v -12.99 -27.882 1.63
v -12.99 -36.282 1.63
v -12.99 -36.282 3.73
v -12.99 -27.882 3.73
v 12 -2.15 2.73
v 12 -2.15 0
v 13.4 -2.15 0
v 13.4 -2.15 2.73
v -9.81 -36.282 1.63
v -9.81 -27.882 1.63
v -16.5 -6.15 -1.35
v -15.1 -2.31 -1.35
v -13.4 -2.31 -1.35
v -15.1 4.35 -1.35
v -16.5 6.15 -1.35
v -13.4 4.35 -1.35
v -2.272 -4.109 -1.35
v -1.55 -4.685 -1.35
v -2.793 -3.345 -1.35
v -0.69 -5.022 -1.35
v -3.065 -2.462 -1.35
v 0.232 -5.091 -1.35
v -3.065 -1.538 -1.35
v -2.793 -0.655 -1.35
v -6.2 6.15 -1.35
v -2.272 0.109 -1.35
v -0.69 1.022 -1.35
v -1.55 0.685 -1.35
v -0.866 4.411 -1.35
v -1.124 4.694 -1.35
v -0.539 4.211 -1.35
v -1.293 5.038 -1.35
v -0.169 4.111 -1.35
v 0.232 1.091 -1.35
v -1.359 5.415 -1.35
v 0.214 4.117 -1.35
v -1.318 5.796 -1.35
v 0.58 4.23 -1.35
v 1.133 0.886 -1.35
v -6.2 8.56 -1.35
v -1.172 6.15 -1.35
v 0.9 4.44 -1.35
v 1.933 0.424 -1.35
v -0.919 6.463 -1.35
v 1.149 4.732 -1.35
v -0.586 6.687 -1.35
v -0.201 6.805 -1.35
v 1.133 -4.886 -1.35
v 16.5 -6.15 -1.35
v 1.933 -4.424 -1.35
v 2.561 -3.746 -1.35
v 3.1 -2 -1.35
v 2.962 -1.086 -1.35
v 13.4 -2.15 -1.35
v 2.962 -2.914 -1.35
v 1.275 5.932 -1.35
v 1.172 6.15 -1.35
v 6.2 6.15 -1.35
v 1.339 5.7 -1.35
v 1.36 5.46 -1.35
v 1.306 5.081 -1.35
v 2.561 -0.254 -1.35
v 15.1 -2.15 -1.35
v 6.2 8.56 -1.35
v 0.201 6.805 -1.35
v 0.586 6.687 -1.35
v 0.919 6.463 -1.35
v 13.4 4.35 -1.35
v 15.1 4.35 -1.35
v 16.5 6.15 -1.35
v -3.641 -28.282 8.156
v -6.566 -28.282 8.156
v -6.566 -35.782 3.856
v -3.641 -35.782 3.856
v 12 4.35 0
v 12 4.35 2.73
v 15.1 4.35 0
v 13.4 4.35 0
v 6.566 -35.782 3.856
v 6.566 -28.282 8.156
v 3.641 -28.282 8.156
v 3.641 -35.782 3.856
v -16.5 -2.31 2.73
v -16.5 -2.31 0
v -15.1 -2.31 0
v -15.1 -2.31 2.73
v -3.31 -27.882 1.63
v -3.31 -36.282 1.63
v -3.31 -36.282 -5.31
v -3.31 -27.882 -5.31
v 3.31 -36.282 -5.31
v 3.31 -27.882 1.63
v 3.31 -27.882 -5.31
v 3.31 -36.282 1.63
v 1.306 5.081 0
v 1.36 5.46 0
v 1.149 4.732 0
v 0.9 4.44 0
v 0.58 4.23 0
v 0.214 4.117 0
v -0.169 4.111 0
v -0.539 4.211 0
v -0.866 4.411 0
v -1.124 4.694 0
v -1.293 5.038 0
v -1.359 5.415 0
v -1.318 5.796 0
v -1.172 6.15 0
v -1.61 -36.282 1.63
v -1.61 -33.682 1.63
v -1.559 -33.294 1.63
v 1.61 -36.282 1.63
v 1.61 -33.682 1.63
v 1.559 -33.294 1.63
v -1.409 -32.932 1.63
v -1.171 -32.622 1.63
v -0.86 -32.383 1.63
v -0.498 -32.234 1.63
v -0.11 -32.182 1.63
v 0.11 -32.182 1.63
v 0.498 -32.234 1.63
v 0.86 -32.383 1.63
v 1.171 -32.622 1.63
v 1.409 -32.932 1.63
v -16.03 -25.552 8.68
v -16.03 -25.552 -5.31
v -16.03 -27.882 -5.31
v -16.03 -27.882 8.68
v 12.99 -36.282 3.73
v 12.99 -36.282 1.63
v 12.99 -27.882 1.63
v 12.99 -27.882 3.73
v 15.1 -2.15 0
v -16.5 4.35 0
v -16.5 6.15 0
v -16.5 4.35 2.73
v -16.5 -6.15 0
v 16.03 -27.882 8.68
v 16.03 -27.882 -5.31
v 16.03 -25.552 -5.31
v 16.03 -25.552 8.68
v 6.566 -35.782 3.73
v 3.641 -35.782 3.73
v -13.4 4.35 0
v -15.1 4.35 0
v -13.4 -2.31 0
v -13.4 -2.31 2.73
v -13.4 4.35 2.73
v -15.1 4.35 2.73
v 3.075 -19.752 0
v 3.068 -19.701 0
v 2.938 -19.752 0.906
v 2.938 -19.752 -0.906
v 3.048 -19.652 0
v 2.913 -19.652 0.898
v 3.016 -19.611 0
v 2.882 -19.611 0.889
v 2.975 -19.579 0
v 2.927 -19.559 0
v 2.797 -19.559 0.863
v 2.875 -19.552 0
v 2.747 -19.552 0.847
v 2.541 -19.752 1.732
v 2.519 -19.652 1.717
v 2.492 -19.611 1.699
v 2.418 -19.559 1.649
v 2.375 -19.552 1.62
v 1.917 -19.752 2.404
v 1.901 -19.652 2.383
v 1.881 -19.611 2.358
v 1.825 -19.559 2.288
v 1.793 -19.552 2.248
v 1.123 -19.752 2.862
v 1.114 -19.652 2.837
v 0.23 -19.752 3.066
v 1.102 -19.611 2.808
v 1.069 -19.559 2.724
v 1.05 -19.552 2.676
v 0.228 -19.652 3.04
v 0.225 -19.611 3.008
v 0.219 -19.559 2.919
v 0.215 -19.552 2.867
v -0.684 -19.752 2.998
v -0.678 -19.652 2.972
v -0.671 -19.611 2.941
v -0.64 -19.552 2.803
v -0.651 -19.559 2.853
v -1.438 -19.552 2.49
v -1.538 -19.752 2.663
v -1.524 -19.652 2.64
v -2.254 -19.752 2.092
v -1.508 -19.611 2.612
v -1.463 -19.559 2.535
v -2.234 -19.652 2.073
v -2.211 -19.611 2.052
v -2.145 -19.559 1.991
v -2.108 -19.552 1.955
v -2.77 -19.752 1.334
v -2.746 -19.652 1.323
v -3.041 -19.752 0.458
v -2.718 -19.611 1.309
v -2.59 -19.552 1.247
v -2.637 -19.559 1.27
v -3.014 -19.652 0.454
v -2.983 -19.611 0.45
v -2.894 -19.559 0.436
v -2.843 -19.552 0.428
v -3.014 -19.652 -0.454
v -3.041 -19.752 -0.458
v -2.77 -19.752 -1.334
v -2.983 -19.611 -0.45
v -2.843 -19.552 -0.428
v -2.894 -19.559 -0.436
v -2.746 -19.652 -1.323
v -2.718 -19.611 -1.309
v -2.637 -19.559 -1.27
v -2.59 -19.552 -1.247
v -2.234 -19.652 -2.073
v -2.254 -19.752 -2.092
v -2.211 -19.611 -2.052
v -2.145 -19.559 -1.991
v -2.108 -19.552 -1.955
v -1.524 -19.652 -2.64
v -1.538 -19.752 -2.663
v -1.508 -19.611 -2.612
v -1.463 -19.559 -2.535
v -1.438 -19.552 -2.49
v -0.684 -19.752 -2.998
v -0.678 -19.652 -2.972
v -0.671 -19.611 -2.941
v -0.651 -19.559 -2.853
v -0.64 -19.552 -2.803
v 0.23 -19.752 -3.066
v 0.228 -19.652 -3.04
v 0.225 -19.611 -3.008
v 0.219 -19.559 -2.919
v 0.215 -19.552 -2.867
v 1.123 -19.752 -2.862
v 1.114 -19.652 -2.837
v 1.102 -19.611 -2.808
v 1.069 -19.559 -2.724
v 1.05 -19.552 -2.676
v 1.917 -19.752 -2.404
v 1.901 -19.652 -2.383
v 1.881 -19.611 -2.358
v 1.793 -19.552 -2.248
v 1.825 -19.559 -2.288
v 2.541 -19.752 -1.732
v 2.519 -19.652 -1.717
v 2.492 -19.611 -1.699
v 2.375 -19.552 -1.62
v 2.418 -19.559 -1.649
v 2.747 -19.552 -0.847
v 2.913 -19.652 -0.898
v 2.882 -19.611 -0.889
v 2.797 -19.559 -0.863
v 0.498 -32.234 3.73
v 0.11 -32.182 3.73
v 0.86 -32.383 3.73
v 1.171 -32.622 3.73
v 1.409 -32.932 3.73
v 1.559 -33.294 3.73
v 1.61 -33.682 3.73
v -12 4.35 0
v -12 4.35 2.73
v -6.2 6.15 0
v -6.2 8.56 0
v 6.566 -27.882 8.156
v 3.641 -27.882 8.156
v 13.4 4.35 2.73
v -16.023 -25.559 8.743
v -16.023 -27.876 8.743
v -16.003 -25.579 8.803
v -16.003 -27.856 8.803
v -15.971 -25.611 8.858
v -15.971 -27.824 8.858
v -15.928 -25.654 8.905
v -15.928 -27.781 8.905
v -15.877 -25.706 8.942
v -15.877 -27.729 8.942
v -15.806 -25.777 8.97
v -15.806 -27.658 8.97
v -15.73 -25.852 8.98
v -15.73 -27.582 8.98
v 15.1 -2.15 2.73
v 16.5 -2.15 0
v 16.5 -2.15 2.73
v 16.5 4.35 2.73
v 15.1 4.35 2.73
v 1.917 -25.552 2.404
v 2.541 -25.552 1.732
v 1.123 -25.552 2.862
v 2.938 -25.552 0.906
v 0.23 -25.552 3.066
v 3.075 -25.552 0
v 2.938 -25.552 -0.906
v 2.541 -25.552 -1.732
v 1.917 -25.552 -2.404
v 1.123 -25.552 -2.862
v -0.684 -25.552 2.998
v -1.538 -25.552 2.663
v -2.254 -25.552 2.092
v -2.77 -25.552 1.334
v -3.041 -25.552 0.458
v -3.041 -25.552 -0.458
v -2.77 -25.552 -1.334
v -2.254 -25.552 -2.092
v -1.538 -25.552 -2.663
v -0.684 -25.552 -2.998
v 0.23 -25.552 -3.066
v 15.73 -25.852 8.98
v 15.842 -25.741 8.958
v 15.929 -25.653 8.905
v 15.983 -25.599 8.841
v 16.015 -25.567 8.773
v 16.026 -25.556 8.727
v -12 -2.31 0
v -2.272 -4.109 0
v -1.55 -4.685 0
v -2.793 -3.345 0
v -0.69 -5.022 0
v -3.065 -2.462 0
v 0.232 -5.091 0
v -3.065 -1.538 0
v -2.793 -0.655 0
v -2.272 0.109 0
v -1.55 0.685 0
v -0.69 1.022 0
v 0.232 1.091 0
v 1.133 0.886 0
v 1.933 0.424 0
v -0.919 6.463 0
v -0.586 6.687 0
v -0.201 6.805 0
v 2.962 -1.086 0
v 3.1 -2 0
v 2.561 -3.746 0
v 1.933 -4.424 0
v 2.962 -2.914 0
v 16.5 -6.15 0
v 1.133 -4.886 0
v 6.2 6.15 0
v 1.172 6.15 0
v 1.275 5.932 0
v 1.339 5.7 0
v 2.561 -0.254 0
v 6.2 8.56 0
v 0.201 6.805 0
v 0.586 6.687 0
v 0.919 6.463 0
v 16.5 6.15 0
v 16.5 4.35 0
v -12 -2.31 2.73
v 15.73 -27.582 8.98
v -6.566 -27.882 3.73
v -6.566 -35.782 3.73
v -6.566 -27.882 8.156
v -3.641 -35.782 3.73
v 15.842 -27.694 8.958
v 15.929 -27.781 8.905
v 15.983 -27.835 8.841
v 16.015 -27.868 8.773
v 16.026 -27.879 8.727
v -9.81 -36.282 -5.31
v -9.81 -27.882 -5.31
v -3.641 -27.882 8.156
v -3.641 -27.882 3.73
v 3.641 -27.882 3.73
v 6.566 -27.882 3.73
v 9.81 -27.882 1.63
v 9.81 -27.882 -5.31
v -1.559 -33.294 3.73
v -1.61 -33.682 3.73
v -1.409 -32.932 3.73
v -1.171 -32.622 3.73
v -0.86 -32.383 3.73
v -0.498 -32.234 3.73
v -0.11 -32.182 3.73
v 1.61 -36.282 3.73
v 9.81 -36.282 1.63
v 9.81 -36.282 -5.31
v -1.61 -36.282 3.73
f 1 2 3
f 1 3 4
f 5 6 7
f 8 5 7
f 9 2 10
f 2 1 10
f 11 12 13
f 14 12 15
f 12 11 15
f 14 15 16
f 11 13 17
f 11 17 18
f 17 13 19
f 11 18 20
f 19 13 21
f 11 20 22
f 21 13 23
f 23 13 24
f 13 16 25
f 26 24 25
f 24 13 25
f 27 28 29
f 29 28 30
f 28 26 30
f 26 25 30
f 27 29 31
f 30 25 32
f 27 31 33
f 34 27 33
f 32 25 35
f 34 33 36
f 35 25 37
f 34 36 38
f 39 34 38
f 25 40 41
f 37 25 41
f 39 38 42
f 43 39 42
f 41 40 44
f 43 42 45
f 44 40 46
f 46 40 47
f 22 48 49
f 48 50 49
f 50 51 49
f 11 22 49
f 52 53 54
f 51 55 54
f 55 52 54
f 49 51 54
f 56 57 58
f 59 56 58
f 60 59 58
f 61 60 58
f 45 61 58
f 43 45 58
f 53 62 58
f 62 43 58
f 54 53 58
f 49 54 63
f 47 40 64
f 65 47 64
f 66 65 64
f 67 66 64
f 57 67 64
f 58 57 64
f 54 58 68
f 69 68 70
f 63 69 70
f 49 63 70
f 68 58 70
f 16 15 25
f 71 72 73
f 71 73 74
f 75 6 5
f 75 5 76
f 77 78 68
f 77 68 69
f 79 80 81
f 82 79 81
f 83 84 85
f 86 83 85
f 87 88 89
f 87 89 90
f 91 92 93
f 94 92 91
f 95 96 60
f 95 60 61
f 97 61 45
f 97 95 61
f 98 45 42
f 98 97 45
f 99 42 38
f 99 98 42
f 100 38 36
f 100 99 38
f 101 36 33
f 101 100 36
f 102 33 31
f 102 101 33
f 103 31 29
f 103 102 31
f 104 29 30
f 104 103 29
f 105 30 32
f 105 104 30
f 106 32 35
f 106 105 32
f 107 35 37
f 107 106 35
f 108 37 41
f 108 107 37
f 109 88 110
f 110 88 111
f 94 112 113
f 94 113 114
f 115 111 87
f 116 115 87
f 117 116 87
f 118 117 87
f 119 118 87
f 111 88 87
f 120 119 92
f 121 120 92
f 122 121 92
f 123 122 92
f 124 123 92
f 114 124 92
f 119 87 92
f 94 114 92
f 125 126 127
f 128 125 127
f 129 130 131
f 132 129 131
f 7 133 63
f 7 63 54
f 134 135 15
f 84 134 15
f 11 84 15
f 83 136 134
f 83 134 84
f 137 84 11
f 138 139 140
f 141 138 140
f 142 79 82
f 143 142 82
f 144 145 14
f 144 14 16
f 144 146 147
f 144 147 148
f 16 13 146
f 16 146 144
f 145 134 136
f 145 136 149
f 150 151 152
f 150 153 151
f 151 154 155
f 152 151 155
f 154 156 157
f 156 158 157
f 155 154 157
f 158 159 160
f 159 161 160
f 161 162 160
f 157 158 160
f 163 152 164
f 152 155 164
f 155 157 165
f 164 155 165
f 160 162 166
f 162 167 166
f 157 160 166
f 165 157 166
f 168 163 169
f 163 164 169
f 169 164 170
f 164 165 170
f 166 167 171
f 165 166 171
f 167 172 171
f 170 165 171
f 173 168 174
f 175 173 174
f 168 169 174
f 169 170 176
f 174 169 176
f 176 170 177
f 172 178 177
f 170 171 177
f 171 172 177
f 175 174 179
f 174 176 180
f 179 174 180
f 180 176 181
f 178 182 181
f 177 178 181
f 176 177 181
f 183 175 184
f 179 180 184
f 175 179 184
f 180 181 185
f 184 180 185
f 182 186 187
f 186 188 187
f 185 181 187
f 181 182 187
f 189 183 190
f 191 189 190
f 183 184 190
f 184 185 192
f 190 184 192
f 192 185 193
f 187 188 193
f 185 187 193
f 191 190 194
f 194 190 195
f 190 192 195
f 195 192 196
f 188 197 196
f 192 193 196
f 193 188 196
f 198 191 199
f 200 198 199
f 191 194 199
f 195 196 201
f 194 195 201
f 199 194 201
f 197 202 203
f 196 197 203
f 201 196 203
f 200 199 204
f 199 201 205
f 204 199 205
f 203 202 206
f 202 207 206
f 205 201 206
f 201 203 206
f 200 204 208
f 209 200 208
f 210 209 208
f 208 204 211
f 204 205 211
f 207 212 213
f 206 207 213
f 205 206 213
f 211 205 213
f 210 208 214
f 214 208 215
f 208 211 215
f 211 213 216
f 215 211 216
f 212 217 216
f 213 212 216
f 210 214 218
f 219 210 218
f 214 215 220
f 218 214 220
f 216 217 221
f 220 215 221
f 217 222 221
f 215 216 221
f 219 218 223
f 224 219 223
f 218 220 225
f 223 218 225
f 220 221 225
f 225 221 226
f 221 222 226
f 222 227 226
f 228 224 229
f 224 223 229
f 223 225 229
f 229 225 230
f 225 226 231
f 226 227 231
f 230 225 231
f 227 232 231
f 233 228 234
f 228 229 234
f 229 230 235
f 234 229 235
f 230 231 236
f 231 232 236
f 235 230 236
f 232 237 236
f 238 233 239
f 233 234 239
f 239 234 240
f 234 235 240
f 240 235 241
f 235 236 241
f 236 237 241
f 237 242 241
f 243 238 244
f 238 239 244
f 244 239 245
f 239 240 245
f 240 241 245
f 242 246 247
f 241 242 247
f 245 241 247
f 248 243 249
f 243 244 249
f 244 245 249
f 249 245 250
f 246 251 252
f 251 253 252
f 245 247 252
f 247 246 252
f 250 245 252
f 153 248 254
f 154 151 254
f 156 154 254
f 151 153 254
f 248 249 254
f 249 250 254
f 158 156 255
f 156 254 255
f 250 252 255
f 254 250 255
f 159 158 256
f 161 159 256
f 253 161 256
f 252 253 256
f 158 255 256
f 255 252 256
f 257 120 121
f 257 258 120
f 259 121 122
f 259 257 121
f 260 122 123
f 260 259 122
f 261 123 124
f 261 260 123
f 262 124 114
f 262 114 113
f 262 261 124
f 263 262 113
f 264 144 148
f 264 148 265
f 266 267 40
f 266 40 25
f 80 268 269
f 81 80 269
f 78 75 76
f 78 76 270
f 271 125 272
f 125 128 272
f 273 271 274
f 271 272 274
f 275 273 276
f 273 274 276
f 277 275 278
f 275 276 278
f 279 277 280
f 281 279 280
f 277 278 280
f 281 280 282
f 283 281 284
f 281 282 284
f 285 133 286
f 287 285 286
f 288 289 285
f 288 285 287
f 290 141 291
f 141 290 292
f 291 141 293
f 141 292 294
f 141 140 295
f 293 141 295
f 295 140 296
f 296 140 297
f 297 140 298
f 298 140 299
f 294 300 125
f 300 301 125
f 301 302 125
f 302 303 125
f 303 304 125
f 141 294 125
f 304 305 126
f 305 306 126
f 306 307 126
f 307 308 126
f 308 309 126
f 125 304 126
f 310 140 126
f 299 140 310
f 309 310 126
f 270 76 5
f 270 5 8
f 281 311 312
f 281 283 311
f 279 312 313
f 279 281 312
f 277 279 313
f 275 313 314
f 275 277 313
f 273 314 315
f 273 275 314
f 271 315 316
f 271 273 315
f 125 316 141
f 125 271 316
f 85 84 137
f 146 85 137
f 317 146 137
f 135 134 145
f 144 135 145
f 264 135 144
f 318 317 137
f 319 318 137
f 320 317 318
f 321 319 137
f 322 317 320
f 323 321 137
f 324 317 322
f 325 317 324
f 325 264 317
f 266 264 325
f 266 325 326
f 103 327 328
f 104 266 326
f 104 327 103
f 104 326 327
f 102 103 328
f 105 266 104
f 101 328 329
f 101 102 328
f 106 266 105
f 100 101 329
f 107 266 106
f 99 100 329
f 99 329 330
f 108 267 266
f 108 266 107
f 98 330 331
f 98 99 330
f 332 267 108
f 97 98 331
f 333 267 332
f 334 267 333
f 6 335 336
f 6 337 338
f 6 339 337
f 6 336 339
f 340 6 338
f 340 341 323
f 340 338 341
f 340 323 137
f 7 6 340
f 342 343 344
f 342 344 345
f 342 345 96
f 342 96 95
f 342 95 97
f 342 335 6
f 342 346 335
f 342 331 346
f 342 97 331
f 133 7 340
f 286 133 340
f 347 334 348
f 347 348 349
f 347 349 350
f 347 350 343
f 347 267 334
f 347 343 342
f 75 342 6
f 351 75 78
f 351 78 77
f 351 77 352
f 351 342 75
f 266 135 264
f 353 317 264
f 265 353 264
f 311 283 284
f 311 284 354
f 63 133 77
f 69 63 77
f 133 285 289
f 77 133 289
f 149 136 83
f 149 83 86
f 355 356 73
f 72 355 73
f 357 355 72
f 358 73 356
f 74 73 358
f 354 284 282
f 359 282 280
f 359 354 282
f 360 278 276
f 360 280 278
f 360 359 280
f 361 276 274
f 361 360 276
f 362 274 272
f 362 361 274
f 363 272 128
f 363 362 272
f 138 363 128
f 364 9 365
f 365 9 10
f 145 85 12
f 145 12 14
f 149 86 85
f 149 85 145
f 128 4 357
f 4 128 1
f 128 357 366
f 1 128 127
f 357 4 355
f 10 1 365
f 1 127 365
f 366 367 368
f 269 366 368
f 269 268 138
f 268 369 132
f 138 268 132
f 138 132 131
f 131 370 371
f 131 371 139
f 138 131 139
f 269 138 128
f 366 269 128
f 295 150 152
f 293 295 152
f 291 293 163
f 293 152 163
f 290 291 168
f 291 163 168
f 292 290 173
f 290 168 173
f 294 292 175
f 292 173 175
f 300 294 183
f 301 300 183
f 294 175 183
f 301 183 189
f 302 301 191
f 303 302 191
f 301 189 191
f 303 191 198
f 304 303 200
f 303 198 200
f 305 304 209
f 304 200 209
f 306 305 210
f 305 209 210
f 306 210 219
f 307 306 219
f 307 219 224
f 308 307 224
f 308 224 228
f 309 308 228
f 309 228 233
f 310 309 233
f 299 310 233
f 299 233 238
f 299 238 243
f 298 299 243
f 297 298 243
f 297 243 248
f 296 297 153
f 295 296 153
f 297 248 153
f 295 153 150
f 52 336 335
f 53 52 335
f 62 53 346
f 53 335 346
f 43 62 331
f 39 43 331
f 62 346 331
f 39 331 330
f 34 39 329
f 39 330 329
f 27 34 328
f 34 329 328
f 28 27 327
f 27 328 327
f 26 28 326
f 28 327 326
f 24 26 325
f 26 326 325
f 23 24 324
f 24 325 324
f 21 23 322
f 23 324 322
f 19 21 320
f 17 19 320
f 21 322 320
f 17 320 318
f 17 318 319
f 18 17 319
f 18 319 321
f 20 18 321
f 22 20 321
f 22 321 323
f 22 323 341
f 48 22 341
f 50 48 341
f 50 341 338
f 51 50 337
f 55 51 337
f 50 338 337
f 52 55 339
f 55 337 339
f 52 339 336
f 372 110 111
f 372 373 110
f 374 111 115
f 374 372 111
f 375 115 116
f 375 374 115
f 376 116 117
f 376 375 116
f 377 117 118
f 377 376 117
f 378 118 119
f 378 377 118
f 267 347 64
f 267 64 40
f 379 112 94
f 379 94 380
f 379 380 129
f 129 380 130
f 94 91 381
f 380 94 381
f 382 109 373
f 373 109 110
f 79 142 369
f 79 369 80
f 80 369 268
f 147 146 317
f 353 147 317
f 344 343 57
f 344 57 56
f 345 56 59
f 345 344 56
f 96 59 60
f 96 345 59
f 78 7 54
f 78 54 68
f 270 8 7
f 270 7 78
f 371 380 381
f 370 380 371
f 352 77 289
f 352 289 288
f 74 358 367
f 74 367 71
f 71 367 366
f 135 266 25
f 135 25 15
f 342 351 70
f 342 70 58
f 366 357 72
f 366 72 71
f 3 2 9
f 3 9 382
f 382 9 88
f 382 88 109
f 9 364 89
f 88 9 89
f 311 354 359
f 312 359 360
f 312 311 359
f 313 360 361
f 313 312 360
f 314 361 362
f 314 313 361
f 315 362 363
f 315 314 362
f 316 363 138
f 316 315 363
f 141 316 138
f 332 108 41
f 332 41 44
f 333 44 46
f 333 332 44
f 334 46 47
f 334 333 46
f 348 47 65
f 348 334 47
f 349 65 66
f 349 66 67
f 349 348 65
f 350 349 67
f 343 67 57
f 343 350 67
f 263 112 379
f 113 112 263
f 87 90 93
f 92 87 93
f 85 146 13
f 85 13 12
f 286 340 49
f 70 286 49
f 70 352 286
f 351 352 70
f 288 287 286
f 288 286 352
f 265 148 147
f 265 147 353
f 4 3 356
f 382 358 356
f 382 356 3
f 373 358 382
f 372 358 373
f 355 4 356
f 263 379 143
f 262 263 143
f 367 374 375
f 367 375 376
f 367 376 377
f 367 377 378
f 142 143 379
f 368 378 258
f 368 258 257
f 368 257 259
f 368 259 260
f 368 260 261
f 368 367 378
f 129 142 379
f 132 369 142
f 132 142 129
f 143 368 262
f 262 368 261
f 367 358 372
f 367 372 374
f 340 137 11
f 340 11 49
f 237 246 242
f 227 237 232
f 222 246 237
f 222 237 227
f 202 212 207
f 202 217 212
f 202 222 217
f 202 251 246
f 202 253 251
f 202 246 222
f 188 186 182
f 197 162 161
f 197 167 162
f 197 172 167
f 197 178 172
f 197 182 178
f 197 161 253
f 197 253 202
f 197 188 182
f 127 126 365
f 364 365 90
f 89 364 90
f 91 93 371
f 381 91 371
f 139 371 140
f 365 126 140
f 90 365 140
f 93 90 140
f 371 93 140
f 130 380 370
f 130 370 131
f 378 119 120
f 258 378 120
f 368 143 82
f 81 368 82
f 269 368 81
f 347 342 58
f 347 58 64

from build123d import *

# Parameters (mm, degrees)
F0_R      = 3.1
F0_W      = 1.4
F0_H      = 6.66
F0_H_2    = 6.5
F1_DEPTH  = 1.35
F2_DEPTH  = 2.73
F0_W_2    = 3.075
F0_H_3    = 6
F4_DEPTH  = 5.31
F5_DEPTH  = 8.98
F0_W_3    = 3.18
F0_H_4    = 8.4
F0_W_4    = 3
F0_W_5    = 1.7
F0_H_5    = 4.1
F6_DEPTH  = 2.1
F7_R      = 1.5
F8_DEPTH  = 6.94
F10_W     = 2.9251344968
F10_H     = 4.4288027566
F11_DEPTH = 7.9
F12_SIZE2 = 7.5
F12_SIZE  = 4.3
F14_R     = 0.3
F15_R     = 0.2


with BuildPart() as f1:
    # F0 (on Top) → F1 (new body)
    with BuildSketch(Plane.XY):
        with BuildLine():
            Line((16.5, 4.35), (16.5, 6.15))
            Line((16.5, 6.15), (6.2, 6.15))
            Line((6.2, 6.15), (1.1719641633, 6.15))
            ThreePointArc((1.1719641633, 6.15), (1.3121492411, 5.817581276), (1.36, 5.46))
            ThreePointArc((1.36, 5.46), (-0.357581276, 4.1478507589), (-1.1719641633, 6.15))
            Line((-1.1719641633, 6.15), (-6.2, 6.15))
            Line((-6.2, 6.15), (-16.5, 6.15))
            Line((-16.5, 6.15), (-16.5, 4.35))
            Line((-16.5, 4.35), (-15.1, 4.35))
            Line((-15.1, 4.35), (-13.4, 4.35))
            Line((-13.4, 4.35), (-12, 4.35))
            Line((-12, 4.35), (-12, -2.31))
            Line((-12, -2.31), (-13.4, -2.31))
            Line((-13.4, -2.31), (-15.1, -2.31))
            Line((-15.1, -2.31), (-16.5, -2.31))
            Line((-16.5, -2.31), (-16.5, -6.15))
            Line((-16.5, -6.15), (16.5, -6.15))
            Line((16.5, -6.15), (16.5, -2.15))
            Line((16.5, -2.15), (15.1, -2.15))
            Line((15.1, -2.15), (13.4, -2.15))
            Line((13.4, -2.15), (12, -2.15))
            Line((12, -2.15), (12, 4.35))
            Line((12, 4.35), (13.4, 4.35))
            Line((13.4, 4.35), (15.1, 4.35))
            Line((15.1, 4.35), (16.5, 4.35))
        make_face()
        with Locations((0, -2)):
            Circle(F0_R, mode=Mode.SUBTRACT)
        with Locations((-15.8, 1.02)):
            Rectangle(F0_W, F0_H)
        with Locations((12.7, 1.1)):
            Rectangle(F0_W, F0_H_2)
        with BuildLine():
            Line((1.1719641633, 6.15), (6.2, 6.15))
            Line((6.2, 6.15), (6.2, 8.56))
            Line((6.2, 8.56), (-6.2, 8.56))
            Line((-6.2, 8.56), (-6.2, 6.15))
            Line((-6.2, 6.15), (-1.1719641633, 6.15))
            ThreePointArc((-1.1719641633, 6.15), (0, 6.82), (1.1719641633, 6.15))
        make_face()
        with Locations((15.8, 1.1)):
            Rectangle(F0_W, F0_H_2)
        with Locations((-12.7, 1.02)):
            Rectangle(F0_W, F0_H)
    extrude(amount=-F1_DEPTH)

    # F0 (on Top) → F2 (join)
    with BuildSketch(Plane.XY):
        with Locations((-12.7, 1.02)):
            Rectangle(F0_W, F0_H)
        with Locations((12.7, 1.1)):
            Rectangle(F0_W, F0_H_2)
        with Locations((15.8, 1.1)):
            Rectangle(F0_W, F0_H_2)
        with Locations((-15.8, 1.02)):
            Rectangle(F0_W, F0_H)
    extrude(amount=F2_DEPTH)


with BuildPart() as f3:
    # F0 (on Top) → F3 (revolve)
    with BuildSketch(Plane.XY):
        with Locations((1.5375, -22.552492097)):
            Rectangle(F0_W_2, F0_H_3)
    revolve(axis=Axis((0, -22.552492097, 0), (0, -1, 0)))

    # F0 (on Top) → F4 (join)
    with BuildSketch(Plane.XY):
        Polygon((16.03, -25.552492097), (3.075, -25.552492097), (0, -25.552492097), (-3.075, -25.552492097), (-16.03, -25.552492097), (-16.03, -27.882492097), (-12.99, -27.882492097), (-9.81, -27.882492097), (-6.81, -27.882492097), (-3.31, -27.882492097), (3.31, -27.882492097), (6.81, -27.882492097), (9.81, -27.882492097), (12.99, -27.882492097), (16.03, -27.882492097), align=None)
    extrude(amount=-F4_DEPTH)

    # F0 (on Top) → F5 (join)
    with BuildSketch(Plane.XY):
        Polygon((16.03, -25.552492097), (3.075, -25.552492097), (0, -25.552492097), (-3.075, -25.552492097), (-16.03, -25.552492097), (-16.03, -27.882492097), (-12.99, -27.882492097), (-9.81, -27.882492097), (-6.81, -27.882492097), (-3.31, -27.882492097), (3.31, -27.882492097), (6.81, -27.882492097), (9.81, -27.882492097), (12.99, -27.882492097), (16.03, -27.882492097), align=None)
    extrude(amount=F5_DEPTH)



with BuildPart() as f6:
    # F0 (on Top) → F6 (new body)
    with BuildSketch(Plane.XY):
        with Locations((11.4, -32.082492097)):
            Rectangle(F0_W_3, F0_H_4)
        with Locations((8.31, -32.082492097)):
            Rectangle(F0_W_4, F0_H_4)
        Polygon((6.81, -36.282492097), (6.81, -27.882492097), (3.31, -27.882492097), (3.31, -32.182492097), (3.31, -36.282492097), align=None)
        Polygon((3.31, -32.182492097), (3.31, -27.882492097), (-3.31, -27.882492097), (-3.31, -32.182492097), (-1.61, -32.182492097), (1.61, -32.182492097), align=None)
        with Locations((2.46, -34.232492097)):
            Rectangle(F0_W_5, F0_H_5)
        with Locations((-2.46, -34.232492097)):
            Rectangle(F0_W_5, F0_H_5)
        Polygon((-3.31, -27.882492097), (-6.81, -27.882492097), (-6.81, -36.282492097), (-3.31, -36.282492097), (-3.31, -32.182492097), align=None)
        with Locations((-8.31, -32.082492097)):
            Rectangle(F0_W_4, F0_H_4)
        with Locations((-11.4, -32.082492097)):
            Rectangle(F0_W_3, F0_H_4)
    extrude(amount=F6_DEPTH)

    # F7
    f7_edges = [f6.edges().sort_by_distance(p)[0] for p in [
        (1.61, -32.182492, 1.05),
        (-1.61, -32.182492, 1.05),
    ]]
    fillet(f7_edges, radius=F7_R)


with BuildPart() as f8:
    # F0 (on Top) → F8 (new body)
    with BuildSketch(Plane.XY):
        with Locations((-8.31, -32.082492097)):
            Rectangle(F0_W_4, F0_H_4)
        Polygon((-3.31, -27.882492097), (-6.81, -27.882492097), (-6.81, -36.282492097), (-3.31, -36.282492097), (-3.31, -32.182492097), align=None)
    extrude(amount=-F8_DEPTH)


with BuildPart() as f8b:
    # F0 (on Top) → F8, piece 2 (new body)
    with BuildSketch(Plane.XY):
        Polygon((6.81, -36.282492097), (6.81, -27.882492097), (3.31, -27.882492097), (3.31, -32.182492097), (3.31, -36.282492097), align=None)
        with Locations((8.31, -32.082492097)):
            Rectangle(F0_W_4, F0_H_4)
    extrude(amount=-F8_DEPTH)


with BuildPart() as f6_1:
    # F9: moved
    add(f6.part.moved(Location((0, 0, 1.63))))


with BuildPart() as f8_1:
    # F9: moved
    add(f8.part.moved(Location((0, 0, 1.63))))


with BuildPart() as f8b_1:
    # F9: moved
    add(f8b.part.moved(Location((0, 0, 1.63))))


with BuildPart() as f3_1:
    add(f3.part)

    add(f6_1.part)  # F11 merges F6
    # F10 (on face) → F11 (join)
    with BuildSketch(Plane.XZ.offset(27.882492097)):
        with Locations((-5.1033761119, 5.9413254494)):
            Rectangle(F10_W, F10_H)
    extrude(amount=F11_DEPTH)

    # F12
    f12_edges = [f3_1.edges().sort_by_distance(p)[0] for p in [
        (-5.103376, -35.782492, 8.155727),
    ]]
    f12_side = f3_1.faces().sort_by_distance((-5.103376, -35.782492, 5.942863))[0]
    chamfer(f12_edges, length=F12_SIZE, length2=F12_SIZE2, reference=f12_side)



with BuildPart() as f3_2:
    add(f3_1.part)

    add(f8_1.part)  # F13 merges F8

    add(f8b_1.part)  # F13 merges F8b
    # F13: F3 across plane
    add(f3_1.part.mirror(Plane.YZ))

    # F14
    f14_edges = [f3_2.edges().sort_by_distance(p)[0] for p in [
        (-16.03, -26.717492, 8.98),
        (16.03, -26.717492, 8.98),
        (0, -27.882492, 8.98),
        (0, -25.552492, 8.98),
    ]]
    fillet(f14_edges, radius=F14_R)

    # F15
    f15_edges = [f3_2.edges().sort_by_distance(p)[0] for p in [
        (-3.075, -19.552492, 0),
    ]]
    fillet(f15_edges, radius=F15_R)


solid = Compound([f1.part, f3_2.part])
